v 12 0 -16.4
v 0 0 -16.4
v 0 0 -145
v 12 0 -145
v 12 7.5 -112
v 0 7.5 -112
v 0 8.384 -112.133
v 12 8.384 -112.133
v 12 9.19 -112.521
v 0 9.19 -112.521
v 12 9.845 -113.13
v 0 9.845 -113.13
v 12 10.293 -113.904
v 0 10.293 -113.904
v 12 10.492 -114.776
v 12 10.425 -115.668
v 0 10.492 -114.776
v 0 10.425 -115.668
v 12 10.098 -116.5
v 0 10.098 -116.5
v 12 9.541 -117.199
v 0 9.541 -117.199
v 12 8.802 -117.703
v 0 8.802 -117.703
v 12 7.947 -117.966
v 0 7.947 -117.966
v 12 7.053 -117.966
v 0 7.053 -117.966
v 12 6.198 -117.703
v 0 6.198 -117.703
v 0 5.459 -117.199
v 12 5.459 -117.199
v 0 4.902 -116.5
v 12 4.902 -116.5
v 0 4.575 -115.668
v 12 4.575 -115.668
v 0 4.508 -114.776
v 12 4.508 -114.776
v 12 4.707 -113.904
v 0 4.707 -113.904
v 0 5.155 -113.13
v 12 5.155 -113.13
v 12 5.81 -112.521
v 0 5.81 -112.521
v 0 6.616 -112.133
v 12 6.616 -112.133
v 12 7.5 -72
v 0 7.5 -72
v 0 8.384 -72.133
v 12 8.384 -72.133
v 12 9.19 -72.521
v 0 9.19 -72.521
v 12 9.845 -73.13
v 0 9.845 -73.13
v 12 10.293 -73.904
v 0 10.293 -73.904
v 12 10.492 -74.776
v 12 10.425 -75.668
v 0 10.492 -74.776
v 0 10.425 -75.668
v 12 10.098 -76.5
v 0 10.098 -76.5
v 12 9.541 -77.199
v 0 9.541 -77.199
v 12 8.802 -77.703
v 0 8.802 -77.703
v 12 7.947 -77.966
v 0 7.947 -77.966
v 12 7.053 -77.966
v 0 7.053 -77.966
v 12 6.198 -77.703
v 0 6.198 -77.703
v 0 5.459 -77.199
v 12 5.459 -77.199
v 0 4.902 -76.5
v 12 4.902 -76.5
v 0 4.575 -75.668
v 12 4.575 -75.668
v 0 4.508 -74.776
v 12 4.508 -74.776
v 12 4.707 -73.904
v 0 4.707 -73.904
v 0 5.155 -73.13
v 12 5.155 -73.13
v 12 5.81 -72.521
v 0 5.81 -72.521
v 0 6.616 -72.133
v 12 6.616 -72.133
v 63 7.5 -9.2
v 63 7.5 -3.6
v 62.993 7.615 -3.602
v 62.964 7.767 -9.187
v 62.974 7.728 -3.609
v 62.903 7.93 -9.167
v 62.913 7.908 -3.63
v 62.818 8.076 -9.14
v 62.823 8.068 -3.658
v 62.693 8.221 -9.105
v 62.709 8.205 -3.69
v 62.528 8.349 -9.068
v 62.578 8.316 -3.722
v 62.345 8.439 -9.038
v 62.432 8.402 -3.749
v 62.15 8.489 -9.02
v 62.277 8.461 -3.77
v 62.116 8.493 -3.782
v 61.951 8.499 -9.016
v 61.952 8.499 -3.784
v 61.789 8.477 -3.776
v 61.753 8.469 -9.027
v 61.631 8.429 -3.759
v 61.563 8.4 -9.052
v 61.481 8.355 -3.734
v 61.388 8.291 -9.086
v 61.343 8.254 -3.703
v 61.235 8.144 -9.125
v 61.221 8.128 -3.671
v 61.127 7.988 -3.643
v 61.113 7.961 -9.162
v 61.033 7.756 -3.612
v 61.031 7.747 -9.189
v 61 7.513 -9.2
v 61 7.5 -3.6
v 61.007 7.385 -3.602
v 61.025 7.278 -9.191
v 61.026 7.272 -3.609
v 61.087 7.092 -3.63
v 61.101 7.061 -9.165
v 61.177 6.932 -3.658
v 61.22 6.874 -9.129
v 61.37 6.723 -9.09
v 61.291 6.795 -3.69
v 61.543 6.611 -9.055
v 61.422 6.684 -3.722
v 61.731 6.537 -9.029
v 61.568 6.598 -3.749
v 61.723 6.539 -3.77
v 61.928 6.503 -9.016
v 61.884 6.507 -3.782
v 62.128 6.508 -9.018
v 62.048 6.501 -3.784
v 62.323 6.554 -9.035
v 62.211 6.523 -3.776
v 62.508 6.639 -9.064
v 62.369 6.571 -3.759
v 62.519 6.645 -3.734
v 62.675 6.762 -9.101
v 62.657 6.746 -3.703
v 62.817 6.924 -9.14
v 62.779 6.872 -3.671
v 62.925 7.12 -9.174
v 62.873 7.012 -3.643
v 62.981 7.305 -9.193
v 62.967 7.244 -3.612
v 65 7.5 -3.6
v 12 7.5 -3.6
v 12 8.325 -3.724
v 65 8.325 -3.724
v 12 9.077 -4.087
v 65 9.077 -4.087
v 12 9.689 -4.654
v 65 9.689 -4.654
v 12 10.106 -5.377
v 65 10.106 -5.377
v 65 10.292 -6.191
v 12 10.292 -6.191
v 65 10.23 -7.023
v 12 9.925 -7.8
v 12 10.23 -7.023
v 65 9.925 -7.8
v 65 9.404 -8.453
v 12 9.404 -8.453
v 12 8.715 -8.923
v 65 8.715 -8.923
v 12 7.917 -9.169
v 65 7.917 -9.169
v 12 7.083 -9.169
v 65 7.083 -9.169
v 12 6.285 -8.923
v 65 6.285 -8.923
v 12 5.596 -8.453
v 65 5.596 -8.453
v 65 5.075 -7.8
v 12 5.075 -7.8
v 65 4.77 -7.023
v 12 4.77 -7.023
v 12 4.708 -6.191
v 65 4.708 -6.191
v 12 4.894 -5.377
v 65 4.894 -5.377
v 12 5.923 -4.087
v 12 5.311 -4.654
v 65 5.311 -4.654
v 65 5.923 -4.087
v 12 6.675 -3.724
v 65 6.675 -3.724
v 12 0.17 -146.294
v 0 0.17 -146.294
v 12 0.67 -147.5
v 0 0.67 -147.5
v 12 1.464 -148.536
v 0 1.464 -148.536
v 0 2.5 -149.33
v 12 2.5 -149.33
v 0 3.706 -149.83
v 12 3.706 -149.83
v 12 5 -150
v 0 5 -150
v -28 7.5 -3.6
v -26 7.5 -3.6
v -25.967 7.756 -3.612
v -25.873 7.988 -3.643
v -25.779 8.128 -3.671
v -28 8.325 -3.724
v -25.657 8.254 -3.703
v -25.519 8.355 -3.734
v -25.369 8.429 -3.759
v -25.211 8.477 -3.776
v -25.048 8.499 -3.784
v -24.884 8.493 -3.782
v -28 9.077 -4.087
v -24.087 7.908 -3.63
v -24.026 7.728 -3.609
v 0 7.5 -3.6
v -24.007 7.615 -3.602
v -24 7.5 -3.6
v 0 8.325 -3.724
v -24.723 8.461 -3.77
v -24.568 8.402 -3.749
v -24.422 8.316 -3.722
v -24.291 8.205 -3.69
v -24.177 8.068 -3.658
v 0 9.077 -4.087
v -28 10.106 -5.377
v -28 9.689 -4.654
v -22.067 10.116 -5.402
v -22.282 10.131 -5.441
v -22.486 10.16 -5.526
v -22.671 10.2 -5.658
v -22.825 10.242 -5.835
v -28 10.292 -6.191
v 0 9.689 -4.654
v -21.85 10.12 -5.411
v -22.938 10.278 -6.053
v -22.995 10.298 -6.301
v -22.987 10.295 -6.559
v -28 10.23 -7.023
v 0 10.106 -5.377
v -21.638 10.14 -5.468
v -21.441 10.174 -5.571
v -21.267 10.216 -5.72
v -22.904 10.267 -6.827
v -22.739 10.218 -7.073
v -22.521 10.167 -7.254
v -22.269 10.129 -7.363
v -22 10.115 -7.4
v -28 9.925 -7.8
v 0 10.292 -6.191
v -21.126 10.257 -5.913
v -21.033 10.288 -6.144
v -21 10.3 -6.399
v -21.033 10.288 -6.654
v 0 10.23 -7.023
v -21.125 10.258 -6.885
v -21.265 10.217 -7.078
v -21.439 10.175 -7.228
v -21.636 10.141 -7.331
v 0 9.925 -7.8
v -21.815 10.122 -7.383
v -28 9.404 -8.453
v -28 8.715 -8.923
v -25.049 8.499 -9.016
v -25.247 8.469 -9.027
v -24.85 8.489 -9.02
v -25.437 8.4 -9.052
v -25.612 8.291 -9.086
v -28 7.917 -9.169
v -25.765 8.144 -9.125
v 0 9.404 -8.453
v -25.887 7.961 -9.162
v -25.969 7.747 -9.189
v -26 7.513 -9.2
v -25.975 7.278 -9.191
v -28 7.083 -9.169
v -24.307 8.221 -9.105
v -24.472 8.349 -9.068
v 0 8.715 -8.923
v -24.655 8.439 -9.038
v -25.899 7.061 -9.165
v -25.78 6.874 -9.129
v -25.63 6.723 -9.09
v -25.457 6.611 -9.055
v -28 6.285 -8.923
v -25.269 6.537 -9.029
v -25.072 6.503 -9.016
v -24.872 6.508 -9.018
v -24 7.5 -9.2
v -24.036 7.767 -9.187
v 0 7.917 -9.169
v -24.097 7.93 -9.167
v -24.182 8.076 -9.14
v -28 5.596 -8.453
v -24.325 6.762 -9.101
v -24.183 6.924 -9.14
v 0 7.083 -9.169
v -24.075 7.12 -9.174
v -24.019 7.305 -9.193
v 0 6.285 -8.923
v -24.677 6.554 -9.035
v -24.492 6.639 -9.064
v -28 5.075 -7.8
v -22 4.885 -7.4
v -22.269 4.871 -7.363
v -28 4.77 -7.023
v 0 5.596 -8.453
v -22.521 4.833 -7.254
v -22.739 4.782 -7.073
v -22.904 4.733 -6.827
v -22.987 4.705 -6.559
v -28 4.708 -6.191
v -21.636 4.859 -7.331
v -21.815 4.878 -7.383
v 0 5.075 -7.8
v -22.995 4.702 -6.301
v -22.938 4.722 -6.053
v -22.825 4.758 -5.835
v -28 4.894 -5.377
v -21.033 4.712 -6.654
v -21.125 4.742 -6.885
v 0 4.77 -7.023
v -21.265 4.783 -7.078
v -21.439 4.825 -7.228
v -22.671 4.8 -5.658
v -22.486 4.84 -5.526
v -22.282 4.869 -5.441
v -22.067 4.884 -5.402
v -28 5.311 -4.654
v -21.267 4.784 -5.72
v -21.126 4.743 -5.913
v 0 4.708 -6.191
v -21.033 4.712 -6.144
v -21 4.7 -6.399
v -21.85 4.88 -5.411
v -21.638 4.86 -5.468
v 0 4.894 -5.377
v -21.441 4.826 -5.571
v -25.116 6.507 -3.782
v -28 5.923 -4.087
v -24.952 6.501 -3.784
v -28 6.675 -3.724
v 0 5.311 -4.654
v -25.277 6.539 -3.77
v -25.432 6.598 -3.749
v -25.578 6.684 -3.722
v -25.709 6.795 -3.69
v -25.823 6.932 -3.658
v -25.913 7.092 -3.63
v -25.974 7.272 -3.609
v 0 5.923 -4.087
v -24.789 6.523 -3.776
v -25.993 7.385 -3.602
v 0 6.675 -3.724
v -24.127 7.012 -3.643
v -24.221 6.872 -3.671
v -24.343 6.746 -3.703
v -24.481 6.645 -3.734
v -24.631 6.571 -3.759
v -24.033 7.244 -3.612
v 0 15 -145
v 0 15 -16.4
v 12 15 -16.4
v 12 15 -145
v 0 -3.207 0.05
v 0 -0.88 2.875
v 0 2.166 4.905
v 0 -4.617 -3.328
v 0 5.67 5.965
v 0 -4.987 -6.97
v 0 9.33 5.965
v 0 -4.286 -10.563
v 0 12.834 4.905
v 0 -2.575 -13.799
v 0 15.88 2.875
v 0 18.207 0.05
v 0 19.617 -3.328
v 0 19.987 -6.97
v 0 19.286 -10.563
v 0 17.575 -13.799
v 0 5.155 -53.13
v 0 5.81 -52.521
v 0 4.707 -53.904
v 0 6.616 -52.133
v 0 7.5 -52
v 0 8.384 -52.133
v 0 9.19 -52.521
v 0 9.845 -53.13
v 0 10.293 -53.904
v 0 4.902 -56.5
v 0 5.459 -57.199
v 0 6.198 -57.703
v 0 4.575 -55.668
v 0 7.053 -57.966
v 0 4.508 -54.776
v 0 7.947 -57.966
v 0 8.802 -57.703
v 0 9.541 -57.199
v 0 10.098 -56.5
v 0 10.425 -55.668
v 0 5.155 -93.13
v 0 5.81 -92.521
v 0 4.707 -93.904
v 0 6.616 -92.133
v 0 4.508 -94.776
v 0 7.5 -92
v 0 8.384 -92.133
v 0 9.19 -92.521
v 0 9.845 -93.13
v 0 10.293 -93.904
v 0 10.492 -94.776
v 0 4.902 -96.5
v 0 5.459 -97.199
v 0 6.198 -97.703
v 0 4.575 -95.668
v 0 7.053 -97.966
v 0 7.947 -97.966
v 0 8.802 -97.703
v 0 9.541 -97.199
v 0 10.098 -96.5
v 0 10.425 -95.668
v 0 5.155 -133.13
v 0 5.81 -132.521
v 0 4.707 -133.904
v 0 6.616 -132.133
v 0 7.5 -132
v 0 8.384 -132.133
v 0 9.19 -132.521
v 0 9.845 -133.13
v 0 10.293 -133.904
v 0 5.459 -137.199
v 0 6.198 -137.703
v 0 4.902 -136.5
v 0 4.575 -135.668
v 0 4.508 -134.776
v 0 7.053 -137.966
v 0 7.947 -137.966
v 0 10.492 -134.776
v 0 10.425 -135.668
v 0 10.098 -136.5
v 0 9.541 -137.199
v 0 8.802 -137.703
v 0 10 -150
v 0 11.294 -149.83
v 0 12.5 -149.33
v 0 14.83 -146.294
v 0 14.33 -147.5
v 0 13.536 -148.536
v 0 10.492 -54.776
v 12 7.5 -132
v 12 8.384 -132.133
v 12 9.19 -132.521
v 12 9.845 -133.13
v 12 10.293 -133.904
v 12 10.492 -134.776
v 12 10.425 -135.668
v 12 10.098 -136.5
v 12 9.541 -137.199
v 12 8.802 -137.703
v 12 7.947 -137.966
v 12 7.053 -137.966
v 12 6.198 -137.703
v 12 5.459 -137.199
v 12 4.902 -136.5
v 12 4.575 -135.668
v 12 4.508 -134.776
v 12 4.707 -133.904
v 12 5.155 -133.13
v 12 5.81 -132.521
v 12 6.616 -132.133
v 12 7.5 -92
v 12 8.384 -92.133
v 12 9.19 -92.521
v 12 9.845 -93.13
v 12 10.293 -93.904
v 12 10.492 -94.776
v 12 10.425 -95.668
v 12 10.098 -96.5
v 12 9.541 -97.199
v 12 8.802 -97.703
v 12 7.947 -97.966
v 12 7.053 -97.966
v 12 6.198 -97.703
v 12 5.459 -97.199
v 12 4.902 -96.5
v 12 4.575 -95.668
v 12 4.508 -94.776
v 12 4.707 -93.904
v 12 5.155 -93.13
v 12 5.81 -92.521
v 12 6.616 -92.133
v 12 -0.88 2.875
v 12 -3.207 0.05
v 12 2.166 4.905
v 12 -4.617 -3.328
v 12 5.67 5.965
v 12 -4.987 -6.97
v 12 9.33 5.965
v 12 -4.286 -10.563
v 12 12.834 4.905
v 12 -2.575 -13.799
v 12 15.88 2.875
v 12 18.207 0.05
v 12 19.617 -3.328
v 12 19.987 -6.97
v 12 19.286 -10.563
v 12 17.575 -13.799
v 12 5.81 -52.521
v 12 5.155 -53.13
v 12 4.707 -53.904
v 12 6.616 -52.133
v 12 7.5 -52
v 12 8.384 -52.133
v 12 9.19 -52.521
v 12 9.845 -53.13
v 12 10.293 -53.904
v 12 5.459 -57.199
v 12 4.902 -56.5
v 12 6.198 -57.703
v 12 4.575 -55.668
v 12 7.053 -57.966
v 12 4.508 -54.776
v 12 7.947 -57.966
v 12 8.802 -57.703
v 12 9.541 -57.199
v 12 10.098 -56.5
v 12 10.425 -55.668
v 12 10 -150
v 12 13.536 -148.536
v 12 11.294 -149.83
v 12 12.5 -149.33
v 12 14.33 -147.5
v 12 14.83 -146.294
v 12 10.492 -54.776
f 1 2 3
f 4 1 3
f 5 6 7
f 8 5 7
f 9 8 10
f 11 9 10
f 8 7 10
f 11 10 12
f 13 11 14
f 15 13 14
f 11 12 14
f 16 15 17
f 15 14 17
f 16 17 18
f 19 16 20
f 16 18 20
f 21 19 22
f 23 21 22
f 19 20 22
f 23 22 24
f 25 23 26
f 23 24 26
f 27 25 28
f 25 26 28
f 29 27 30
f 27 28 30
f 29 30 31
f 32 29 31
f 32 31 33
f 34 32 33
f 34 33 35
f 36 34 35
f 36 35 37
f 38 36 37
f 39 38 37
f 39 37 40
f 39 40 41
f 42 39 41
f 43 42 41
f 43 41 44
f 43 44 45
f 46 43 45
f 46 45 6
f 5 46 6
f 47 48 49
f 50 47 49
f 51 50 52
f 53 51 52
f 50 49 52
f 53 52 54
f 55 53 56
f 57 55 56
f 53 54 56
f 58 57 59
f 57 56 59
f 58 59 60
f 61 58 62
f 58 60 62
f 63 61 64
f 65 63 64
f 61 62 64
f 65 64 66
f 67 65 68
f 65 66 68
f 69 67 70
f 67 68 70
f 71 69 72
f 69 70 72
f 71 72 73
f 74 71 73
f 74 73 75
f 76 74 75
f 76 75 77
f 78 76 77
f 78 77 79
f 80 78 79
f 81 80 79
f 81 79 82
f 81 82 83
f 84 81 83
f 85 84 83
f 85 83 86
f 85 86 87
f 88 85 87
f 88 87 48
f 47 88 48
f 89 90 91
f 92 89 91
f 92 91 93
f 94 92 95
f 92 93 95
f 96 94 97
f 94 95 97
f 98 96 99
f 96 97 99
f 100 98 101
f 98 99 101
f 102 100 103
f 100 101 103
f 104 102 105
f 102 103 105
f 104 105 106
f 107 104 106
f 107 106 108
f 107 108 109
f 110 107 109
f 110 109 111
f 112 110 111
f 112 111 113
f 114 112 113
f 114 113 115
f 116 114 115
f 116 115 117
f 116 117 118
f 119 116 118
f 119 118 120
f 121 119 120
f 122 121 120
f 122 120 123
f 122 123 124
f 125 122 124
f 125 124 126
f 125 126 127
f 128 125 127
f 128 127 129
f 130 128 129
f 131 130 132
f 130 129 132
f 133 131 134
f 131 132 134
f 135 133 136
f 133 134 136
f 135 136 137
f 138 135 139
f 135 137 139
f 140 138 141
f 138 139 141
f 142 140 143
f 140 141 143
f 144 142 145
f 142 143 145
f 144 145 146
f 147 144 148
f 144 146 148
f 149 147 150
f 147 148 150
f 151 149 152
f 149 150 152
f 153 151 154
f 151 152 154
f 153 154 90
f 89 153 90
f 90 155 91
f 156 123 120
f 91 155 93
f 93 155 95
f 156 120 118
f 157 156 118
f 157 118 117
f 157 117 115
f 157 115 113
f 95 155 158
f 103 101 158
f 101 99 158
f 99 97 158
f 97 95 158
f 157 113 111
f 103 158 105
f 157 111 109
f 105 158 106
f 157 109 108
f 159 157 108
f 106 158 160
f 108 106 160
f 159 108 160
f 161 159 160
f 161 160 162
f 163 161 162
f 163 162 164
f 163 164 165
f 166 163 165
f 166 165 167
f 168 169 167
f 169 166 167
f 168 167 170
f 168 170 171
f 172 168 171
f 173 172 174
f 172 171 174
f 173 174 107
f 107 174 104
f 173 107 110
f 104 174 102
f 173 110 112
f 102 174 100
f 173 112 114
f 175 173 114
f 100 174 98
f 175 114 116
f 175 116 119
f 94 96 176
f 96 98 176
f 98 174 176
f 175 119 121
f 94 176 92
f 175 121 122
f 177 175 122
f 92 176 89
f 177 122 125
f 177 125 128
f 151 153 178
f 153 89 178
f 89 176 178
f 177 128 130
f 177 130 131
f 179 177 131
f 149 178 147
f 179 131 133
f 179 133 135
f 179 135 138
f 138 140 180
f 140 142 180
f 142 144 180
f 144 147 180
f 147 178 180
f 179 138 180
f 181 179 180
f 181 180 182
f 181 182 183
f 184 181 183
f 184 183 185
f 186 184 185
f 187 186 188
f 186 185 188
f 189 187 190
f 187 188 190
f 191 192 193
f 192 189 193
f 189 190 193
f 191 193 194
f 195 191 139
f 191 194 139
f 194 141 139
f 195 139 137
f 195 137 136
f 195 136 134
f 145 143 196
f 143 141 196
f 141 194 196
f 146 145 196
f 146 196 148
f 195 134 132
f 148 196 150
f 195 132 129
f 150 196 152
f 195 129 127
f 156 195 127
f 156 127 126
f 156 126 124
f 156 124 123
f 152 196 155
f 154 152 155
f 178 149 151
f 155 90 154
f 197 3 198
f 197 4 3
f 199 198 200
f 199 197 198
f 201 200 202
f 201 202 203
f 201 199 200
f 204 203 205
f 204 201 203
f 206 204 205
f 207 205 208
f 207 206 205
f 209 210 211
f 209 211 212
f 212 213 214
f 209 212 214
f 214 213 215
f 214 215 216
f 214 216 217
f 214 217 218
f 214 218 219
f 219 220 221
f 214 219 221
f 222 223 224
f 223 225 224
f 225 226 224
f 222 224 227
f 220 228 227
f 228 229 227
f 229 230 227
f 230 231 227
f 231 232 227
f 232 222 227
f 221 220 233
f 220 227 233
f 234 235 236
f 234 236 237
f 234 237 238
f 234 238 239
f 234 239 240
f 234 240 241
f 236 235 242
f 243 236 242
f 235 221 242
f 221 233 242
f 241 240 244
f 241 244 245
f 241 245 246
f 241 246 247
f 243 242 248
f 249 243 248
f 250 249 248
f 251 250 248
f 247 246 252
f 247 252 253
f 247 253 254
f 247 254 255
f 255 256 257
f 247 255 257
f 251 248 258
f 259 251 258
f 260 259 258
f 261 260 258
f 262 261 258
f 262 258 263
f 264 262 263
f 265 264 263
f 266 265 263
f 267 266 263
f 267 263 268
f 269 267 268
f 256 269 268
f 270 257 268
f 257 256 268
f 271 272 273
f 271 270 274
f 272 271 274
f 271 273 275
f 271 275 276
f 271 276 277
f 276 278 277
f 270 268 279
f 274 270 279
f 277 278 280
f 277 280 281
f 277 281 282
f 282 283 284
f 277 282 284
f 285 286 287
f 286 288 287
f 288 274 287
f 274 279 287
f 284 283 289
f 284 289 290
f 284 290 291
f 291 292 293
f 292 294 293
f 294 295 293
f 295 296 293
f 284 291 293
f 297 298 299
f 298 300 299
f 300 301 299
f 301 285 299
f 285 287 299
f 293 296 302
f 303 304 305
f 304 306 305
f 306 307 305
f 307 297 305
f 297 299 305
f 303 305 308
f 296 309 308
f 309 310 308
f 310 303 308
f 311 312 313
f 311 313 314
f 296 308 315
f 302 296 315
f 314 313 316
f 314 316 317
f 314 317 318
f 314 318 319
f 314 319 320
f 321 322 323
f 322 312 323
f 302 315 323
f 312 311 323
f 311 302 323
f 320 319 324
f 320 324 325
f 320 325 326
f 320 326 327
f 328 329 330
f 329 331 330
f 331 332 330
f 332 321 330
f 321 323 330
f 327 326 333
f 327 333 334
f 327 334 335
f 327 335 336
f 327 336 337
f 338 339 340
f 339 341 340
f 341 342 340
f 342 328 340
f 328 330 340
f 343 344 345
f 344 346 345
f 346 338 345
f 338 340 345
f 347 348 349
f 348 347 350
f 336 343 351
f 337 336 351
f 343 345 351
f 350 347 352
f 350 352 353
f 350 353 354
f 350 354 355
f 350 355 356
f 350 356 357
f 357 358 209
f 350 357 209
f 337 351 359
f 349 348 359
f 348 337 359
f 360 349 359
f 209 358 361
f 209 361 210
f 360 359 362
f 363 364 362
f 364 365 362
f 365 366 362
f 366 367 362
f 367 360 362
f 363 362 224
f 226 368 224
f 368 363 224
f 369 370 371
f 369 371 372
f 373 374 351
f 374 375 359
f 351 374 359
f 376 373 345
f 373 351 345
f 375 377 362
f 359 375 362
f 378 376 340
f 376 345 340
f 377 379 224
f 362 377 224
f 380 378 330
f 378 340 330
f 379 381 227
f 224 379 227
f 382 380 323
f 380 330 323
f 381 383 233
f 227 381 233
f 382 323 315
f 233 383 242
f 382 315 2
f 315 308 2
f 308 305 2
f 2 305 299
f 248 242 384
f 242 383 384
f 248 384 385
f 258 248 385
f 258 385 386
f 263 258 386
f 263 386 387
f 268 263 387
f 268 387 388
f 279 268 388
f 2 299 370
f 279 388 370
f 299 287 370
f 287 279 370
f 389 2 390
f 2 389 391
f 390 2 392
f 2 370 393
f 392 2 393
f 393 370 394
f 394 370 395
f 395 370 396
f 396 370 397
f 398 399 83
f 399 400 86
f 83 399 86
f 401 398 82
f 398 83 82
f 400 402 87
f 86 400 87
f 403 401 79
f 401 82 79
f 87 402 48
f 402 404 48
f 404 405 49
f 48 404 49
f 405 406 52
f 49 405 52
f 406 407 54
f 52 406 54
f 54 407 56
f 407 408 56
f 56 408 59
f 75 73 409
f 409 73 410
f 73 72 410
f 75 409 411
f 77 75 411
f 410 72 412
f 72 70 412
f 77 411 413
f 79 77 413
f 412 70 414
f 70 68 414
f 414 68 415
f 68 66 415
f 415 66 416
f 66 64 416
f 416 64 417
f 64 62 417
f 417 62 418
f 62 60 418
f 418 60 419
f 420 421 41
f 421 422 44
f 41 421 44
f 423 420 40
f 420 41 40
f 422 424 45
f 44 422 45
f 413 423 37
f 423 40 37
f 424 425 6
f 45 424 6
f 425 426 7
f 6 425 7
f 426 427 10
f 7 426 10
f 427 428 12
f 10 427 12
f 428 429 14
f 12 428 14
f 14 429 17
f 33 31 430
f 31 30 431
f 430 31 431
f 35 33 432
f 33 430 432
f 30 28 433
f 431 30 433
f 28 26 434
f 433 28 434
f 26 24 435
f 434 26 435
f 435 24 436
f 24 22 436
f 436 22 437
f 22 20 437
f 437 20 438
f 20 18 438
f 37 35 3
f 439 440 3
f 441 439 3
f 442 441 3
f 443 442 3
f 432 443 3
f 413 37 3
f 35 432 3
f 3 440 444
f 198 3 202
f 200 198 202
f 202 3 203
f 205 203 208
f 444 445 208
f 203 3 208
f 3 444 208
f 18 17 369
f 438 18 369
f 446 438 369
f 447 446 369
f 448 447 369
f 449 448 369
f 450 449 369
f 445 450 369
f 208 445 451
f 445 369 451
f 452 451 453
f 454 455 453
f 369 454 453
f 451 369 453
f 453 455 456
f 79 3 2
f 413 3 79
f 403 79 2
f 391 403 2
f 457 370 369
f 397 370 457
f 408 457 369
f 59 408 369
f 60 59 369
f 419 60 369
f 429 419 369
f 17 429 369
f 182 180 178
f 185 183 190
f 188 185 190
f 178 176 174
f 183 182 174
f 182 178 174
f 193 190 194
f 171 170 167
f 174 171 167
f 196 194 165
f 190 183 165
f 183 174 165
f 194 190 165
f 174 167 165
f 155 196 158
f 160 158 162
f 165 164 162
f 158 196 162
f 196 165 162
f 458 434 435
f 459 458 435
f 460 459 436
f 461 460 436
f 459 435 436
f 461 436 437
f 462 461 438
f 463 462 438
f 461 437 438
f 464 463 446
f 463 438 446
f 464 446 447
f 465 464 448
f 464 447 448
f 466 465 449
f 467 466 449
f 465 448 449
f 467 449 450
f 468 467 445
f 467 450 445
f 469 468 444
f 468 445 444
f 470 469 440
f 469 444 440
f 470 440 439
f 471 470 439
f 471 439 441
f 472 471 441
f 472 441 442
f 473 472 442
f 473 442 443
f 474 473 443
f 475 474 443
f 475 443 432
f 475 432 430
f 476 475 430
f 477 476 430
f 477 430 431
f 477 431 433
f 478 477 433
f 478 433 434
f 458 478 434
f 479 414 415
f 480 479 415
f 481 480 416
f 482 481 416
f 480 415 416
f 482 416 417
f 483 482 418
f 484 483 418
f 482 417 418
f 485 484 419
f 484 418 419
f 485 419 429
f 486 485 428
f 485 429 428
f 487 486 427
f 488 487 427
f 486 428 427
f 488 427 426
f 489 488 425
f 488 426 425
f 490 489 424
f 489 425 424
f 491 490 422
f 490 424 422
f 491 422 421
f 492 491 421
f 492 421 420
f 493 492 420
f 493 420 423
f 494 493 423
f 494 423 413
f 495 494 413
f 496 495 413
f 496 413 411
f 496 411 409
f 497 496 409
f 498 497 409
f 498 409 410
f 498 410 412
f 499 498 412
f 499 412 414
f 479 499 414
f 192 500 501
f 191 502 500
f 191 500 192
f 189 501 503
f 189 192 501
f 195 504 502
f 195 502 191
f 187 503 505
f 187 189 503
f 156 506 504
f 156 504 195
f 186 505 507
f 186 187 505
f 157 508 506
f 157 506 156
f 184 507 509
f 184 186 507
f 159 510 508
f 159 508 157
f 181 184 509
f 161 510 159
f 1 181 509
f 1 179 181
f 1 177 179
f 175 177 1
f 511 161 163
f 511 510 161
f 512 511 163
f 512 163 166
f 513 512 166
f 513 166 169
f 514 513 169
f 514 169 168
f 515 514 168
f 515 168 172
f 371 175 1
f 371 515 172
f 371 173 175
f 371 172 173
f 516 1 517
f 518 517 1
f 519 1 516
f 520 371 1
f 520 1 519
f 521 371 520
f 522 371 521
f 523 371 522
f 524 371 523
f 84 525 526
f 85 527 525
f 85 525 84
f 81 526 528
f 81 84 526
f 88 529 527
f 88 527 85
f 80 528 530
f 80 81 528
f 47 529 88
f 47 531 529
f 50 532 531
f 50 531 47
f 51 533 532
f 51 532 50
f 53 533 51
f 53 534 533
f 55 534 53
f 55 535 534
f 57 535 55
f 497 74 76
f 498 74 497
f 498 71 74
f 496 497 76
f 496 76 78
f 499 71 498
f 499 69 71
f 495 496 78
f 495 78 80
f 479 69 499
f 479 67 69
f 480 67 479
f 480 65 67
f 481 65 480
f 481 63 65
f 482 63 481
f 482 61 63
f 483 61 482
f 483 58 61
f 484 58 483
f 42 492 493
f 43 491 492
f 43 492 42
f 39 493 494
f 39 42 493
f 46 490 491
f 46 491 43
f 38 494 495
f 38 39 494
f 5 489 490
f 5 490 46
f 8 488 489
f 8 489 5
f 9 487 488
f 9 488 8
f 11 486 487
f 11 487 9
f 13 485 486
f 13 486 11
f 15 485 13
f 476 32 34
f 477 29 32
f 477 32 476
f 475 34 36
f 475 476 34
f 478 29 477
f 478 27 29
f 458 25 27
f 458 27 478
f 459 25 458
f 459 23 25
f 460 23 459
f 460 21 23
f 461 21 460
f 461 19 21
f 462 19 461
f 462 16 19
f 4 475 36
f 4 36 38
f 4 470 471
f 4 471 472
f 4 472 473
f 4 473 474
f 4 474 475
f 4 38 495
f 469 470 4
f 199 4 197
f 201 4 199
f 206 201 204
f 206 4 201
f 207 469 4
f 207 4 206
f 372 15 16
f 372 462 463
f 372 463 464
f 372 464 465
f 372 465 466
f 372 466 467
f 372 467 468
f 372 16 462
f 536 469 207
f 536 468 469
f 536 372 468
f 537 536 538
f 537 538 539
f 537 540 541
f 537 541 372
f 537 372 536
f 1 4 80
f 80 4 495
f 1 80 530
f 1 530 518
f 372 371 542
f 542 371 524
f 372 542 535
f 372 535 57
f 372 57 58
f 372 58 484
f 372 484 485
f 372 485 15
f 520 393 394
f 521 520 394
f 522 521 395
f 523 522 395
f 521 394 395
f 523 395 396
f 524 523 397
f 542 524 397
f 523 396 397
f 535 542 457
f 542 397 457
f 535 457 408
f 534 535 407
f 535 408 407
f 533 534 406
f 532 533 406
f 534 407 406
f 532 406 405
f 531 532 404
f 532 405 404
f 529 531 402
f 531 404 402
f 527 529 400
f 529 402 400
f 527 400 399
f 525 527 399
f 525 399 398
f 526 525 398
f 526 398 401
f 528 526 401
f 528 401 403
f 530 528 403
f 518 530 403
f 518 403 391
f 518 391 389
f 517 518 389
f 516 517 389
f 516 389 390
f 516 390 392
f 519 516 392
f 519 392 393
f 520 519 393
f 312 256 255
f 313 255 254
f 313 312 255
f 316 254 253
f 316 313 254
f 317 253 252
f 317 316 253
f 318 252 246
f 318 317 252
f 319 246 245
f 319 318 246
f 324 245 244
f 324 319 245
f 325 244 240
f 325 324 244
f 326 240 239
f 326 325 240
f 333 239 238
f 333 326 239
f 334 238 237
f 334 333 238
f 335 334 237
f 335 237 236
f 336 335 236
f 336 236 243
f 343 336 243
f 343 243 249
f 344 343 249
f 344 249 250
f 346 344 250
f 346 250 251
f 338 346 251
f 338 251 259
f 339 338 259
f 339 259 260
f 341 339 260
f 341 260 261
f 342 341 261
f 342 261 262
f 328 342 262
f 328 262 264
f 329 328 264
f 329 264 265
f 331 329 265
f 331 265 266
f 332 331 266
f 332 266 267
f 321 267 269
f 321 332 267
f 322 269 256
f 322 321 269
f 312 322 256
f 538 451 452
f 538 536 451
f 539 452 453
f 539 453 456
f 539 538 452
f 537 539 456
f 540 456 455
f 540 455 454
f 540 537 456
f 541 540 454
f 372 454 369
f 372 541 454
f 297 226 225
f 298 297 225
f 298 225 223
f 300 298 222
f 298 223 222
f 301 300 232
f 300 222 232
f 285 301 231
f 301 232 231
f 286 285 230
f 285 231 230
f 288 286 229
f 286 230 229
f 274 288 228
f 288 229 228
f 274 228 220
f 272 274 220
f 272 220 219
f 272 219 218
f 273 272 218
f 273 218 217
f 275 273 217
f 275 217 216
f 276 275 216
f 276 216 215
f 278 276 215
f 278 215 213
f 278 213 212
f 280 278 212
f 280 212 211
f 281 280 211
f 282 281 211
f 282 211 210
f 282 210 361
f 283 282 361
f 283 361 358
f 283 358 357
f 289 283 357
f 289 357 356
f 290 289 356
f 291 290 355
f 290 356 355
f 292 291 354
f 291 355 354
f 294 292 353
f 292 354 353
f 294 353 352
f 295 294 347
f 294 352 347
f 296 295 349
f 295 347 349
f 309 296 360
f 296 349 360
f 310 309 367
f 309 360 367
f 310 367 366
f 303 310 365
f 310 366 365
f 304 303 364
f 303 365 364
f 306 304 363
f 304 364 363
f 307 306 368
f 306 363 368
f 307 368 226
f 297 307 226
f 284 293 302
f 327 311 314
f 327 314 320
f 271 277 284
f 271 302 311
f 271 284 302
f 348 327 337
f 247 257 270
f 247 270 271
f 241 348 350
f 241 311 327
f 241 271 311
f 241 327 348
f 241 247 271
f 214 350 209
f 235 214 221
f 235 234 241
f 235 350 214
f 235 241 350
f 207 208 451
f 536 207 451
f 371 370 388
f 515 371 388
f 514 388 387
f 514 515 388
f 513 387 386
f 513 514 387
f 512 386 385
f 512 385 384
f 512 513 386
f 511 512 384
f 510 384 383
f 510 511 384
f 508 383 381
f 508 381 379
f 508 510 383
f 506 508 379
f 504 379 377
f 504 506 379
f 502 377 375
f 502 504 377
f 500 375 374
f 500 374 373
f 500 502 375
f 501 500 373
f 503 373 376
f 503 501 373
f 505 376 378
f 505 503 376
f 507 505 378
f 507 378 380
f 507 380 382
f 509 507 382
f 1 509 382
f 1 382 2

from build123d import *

# Parameters (mm, degrees)
SKETCH_1_W           = 150
SKETCH_1_H           = 15
EXTRUDE_1_DEPTH      = 12
FILLET_1_R           = 5
SKETCH_6_R           = 12.5
EXTRUDE_2_DEPTH      = 12
EXTRUDE_5_DEPTH      = 28
EXTRUDE_5_DEPTH_BACK = 65
SKETCH_15_R          = 2.8
CUT_EXTRUDE_9_REACH  = 166.697
SKETCH_16_R          = 1
CUT_EXTRUDE_10_REACH = 166.697
SKETCH_17_R          = 3
SKETCH_18_R          = 1
CUT_EXTRUDE_11_DEPTH = 15


with BuildPart() as part:
    # 草图1 → 凸台-拉伸1 (new body)
    with BuildSketch(Plane(origin=(0, 0, 0), x_dir=(0, 0, -1), z_dir=(1, 0, 0))):
        with Locations((75, 7.5)):
            Rectangle(SKETCH_1_W, SKETCH_1_H)
    extrude(amount=EXTRUDE_1_DEPTH)

    # 圆角1
    fillet_1_edges = [part.edges().sort_by_distance(p)[0] for p in [
        (6, 15, 0),
        (6, 15, -150),
        (6, 0, -150),
        (6, 0, 0),
    ]]
    fillet(fillet_1_edges, radius=FILLET_1_R)

    # 草图6 → 凸台-拉伸2 (add)
    with BuildSketch(Plane(origin=(12, 0, 0), x_dir=(0, 0, -1), z_dir=(1, 0, 0))):
        with Locations((6.4, 7.5)):
            Circle(SKETCH_6_R)
    extrude(amount=-EXTRUDE_2_DEPTH)

    # 草图15 → 凸台-拉伸5 (add, two sides: drawn at the far end of the back side and taken through both)
    with BuildSketch(Plane.ZY.offset(-EXTRUDE_5_DEPTH_BACK)):
        with Locations((-6.4, 7.5)):
            Circle(SKETCH_15_R)
    extrude(amount=EXTRUDE_5_DEPTH + EXTRUDE_5_DEPTH_BACK)

    # 草图16 → 切除-拉伸9 (cut, up to next)
    with BuildSketch(Plane.XY, mode=Mode.PRIVATE) as cut_extrude_9_sk1:
        with Locations((-25, 7.5)):
            Circle(SKETCH_16_R)
    cut_extrude_9_tool1 = extrude(cut_extrude_9_sk1.sketch, amount=-CUT_EXTRUDE_9_REACH, mode=Mode.PRIVATE) & part.part
    # 草图16 → 切除-拉伸9 (cut, up to next)
    with BuildSketch(Plane.XY, mode=Mode.PRIVATE) as cut_extrude_9_sk2:
        with Locations((62, 7.5)):
            Circle(SKETCH_16_R)
    cut_extrude_9_tool2 = extrude(cut_extrude_9_sk2.sketch, amount=-CUT_EXTRUDE_9_REACH, mode=Mode.PRIVATE) & part.part
    add(cut_extrude_9_tool1.solids().sort_by_distance((-25, 7.5, 0))[0], mode=Mode.SUBTRACT)
    add(cut_extrude_9_tool2.solids().sort_by_distance((62, 7.5, 0))[0], mode=Mode.SUBTRACT)

    # 草图17 → 切除-拉伸10 (cut, up to next)
    with BuildSketch(Plane.ZY, mode=Mode.PRIVATE) as cut_extrude_10_sk1:
        with Locations((-135, 7.5)):
            Circle(SKETCH_17_R)
    cut_extrude_10_tool1 = extrude(cut_extrude_10_sk1.sketch, amount=-CUT_EXTRUDE_10_REACH, mode=Mode.PRIVATE) & part.part
    # 草图17 → 切除-拉伸10 (cut, up to next)
    with BuildSketch(Plane.ZY, mode=Mode.PRIVATE) as cut_extrude_10_sk2:
        with Locations((-115, 7.5)):
            Circle(SKETCH_17_R)
    cut_extrude_10_tool2 = extrude(cut_extrude_10_sk2.sketch, amount=-CUT_EXTRUDE_10_REACH, mode=Mode.PRIVATE) & part.part
    # 草图17 → 切除-拉伸10 (cut, up to next)
    with BuildSketch(Plane.ZY, mode=Mode.PRIVATE) as cut_extrude_10_sk3:
        with Locations((-95, 7.5)):
            Circle(SKETCH_17_R)
    cut_extrude_10_tool3 = extrude(cut_extrude_10_sk3.sketch, amount=-CUT_EXTRUDE_10_REACH, mode=Mode.PRIVATE) & part.part
    # 草图17 → 切除-拉伸10 (cut, up to next)
    with BuildSketch(Plane.ZY, mode=Mode.PRIVATE) as cut_extrude_10_sk4:
        with Locations((-75, 7.5)):
            Circle(SKETCH_17_R)
    cut_extrude_10_tool4 = extrude(cut_extrude_10_sk4.sketch, amount=-CUT_EXTRUDE_10_REACH, mode=Mode.PRIVATE) & part.part
    # 草图17 → 切除-拉伸10 (cut, up to next)
    with BuildSketch(Plane.ZY, mode=Mode.PRIVATE) as cut_extrude_10_sk5:
        with Locations((-55, 7.5)):
            Circle(SKETCH_17_R)
    cut_extrude_10_tool5 = extrude(cut_extrude_10_sk5.sketch, amount=-CUT_EXTRUDE_10_REACH, mode=Mode.PRIVATE) & part.part
    add(cut_extrude_10_tool1.solids().sort_by_distance((0, 7.5, -135))[0], mode=Mode.SUBTRACT)
    add(cut_extrude_10_tool2.solids().sort_by_distance((0, 7.5, -115))[0], mode=Mode.SUBTRACT)
    add(cut_extrude_10_tool3.solids().sort_by_distance((0, 7.5, -95))[0], mode=Mode.SUBTRACT)
    add(cut_extrude_10_tool4.solids().sort_by_distance((0, 7.5, -75))[0], mode=Mode.SUBTRACT)
    add(cut_extrude_10_tool5.solids().sort_by_distance((0, 7.5, -55))[0], mode=Mode.SUBTRACT)

    # 草图18 → 切除-拉伸11 (cut)
    with BuildSketch(Plane(origin=(0, 0, 0), x_dir=(1, 0, 0), z_dir=(0, 1, 0))):
        with Locations(Location((-22, 6.4, 0), (0, 0, 90))):
            Circle(SKETCH_18_R)
    extrude(amount=CUT_EXTRUDE_11_DEPTH, mode=Mode.SUBTRACT)


solid = part.part
